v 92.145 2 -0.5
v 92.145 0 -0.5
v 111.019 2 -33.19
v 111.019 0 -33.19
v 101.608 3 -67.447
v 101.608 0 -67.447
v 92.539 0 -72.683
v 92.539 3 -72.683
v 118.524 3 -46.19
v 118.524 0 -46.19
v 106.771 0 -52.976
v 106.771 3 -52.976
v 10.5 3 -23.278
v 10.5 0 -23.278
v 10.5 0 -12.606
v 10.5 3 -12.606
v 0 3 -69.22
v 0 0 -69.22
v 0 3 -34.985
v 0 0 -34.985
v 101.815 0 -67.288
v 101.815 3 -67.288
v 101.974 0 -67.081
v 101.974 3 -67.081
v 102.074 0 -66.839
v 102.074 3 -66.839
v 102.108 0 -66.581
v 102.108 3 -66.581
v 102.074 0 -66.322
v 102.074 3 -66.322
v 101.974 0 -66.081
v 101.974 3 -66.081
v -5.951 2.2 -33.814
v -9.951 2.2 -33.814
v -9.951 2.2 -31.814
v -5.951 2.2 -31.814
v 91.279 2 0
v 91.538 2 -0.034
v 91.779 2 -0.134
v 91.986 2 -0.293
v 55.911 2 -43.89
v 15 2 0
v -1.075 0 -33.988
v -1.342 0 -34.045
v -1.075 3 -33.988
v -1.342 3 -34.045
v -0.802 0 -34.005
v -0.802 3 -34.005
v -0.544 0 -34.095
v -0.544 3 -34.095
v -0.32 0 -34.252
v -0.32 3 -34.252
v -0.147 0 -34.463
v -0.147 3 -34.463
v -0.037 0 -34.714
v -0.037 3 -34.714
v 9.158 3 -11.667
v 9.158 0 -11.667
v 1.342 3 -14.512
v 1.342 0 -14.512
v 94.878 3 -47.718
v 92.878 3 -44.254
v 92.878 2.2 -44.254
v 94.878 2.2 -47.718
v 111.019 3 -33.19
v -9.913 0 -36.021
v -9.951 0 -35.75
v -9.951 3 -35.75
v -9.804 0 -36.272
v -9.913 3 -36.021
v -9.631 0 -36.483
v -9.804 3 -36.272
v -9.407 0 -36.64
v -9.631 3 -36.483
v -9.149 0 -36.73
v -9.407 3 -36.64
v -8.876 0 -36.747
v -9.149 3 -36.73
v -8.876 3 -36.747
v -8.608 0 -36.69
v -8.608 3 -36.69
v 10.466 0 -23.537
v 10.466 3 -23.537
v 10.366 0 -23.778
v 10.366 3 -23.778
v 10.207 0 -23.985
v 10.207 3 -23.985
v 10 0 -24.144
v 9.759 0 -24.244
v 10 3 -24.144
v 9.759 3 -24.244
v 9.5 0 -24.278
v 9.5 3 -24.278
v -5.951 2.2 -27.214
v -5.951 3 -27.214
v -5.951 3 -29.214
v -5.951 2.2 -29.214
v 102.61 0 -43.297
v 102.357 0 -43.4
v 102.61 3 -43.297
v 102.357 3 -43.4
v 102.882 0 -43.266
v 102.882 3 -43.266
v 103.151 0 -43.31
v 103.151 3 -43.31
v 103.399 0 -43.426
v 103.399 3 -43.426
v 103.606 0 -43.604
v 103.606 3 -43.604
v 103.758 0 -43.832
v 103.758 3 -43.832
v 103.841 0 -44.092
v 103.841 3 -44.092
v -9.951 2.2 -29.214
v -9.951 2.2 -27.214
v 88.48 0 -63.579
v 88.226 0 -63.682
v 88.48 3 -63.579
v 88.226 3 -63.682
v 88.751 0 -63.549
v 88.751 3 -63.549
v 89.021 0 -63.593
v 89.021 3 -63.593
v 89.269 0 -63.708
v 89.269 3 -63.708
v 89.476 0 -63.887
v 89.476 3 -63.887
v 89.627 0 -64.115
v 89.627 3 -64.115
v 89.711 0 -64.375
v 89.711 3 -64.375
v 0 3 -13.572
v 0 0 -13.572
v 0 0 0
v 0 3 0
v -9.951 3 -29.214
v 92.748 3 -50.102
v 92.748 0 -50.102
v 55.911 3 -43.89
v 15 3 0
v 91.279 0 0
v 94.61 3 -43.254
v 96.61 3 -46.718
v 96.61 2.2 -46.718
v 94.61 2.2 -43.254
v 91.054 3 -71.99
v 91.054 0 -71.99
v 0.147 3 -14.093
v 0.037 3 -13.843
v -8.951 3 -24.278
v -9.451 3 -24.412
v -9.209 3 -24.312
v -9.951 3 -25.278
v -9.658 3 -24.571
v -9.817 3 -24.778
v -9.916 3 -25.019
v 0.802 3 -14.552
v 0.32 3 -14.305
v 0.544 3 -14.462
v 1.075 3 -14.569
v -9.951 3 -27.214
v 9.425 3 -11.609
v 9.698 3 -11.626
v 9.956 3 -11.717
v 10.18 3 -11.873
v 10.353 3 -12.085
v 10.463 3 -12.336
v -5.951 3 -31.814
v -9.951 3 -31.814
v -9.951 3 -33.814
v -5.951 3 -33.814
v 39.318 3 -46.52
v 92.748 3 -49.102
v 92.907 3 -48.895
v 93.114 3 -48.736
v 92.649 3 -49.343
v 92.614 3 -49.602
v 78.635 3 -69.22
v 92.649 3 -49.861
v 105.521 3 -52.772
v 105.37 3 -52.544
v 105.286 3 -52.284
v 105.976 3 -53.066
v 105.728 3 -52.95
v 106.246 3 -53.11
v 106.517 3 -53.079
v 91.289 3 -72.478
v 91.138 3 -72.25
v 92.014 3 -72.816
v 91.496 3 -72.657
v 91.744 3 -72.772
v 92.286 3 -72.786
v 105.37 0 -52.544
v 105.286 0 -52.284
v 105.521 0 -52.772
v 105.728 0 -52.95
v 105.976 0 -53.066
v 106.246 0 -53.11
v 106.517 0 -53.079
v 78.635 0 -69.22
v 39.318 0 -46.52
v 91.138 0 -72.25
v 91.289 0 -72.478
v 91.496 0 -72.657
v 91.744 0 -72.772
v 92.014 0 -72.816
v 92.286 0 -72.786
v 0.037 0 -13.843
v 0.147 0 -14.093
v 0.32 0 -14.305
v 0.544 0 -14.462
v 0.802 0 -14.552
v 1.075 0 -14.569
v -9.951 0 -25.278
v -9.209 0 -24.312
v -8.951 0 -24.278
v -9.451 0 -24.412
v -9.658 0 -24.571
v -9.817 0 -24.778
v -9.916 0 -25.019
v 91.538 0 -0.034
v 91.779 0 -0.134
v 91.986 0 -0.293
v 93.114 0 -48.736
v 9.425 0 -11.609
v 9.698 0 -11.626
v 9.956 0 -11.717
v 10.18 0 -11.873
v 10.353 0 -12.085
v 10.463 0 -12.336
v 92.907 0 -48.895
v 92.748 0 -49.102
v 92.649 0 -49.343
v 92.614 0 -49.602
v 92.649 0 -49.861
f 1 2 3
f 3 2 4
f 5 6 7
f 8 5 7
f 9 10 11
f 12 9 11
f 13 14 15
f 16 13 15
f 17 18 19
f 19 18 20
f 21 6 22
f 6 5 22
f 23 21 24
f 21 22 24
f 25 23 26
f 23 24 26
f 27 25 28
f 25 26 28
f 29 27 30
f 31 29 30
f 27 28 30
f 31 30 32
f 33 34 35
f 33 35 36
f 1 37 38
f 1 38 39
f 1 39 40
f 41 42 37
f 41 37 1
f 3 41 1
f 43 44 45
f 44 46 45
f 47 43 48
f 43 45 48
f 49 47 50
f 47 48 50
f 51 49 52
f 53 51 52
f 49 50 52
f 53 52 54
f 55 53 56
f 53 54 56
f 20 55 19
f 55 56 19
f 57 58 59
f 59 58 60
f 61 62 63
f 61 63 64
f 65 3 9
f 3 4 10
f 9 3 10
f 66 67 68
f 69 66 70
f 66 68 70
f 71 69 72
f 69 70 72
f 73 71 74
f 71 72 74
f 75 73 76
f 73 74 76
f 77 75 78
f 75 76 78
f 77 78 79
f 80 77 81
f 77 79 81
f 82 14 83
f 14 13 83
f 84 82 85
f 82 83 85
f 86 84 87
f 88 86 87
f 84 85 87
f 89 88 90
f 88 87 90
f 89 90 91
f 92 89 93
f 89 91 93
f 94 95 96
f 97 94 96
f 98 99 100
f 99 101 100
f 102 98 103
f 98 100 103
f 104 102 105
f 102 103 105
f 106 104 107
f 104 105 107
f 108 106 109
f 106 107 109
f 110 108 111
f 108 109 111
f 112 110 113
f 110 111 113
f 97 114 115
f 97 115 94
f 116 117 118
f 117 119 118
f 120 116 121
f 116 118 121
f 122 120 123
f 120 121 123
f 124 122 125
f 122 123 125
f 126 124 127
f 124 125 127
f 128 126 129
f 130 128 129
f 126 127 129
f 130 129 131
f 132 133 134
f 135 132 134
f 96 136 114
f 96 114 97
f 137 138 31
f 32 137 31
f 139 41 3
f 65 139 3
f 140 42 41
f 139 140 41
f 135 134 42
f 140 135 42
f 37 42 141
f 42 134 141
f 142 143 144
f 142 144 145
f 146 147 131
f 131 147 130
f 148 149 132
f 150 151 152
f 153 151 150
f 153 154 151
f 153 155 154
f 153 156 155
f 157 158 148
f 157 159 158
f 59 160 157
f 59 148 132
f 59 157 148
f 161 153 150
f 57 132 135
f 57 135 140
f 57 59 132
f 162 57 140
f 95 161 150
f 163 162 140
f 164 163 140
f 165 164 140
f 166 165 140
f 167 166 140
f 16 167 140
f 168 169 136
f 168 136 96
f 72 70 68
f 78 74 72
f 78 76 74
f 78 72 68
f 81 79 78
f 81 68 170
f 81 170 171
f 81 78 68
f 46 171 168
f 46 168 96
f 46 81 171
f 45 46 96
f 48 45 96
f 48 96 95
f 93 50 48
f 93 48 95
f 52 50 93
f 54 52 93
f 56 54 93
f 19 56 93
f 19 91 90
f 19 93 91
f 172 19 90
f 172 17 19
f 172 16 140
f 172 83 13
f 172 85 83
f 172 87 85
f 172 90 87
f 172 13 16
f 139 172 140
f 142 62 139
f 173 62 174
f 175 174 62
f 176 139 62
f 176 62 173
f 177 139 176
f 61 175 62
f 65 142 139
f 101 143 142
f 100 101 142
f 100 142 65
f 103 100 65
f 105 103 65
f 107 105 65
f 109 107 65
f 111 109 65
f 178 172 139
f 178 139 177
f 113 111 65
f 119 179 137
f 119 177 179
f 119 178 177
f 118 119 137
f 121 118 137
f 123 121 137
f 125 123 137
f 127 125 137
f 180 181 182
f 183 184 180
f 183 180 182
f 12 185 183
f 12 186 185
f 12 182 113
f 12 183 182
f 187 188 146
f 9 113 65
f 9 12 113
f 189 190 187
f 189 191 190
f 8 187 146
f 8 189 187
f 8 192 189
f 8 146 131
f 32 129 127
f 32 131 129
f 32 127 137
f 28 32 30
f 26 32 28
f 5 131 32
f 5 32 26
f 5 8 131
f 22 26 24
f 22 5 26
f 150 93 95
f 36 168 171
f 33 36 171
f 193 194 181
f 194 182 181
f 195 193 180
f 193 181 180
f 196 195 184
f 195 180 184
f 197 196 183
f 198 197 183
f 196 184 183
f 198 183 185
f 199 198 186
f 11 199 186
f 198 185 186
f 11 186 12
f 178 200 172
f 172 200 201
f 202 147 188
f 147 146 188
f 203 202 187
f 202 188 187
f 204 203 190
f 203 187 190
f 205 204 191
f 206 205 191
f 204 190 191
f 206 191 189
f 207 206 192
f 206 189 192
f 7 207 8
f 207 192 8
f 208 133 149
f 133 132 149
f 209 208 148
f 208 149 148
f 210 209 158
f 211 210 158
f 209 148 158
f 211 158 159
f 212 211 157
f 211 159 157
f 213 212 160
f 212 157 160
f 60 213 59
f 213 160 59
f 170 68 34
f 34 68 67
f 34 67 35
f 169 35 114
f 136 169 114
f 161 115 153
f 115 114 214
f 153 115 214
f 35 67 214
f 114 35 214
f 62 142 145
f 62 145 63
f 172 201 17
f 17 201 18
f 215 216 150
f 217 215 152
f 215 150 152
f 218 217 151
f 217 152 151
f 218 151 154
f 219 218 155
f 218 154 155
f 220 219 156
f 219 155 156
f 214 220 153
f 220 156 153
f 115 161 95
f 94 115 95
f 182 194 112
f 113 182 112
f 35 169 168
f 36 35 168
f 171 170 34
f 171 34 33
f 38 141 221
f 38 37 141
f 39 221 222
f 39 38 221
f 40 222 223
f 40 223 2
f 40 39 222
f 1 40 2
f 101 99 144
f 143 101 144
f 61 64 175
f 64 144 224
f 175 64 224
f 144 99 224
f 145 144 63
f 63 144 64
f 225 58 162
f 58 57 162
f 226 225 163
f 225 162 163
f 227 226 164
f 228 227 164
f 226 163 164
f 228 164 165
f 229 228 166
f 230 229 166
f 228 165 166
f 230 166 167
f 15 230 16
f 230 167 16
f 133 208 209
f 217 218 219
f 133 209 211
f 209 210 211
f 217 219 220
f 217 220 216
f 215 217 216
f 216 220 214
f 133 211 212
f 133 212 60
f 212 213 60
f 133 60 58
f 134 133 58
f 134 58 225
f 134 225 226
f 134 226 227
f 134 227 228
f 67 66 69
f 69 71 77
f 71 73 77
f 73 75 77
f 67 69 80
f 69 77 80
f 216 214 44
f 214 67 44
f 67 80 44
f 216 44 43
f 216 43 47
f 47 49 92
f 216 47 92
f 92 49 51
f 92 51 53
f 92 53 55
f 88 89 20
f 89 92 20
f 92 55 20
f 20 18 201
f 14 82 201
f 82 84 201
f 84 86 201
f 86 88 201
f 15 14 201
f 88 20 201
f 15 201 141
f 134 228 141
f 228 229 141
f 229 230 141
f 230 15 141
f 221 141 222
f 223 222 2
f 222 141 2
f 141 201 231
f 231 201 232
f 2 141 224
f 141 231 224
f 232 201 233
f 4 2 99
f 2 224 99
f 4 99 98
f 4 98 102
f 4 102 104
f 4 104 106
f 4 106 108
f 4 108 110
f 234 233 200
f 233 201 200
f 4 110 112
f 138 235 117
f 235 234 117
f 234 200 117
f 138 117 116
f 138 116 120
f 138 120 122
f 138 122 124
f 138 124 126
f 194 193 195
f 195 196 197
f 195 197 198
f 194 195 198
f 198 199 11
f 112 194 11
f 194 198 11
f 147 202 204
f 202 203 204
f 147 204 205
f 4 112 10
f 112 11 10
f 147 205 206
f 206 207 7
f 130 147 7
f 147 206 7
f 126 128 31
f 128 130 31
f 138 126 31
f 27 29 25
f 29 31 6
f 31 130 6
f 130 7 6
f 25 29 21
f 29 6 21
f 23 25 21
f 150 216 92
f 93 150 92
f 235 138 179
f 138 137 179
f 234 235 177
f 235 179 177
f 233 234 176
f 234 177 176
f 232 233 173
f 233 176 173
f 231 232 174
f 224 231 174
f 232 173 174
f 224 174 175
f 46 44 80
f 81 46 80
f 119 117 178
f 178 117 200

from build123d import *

# Parameters (mm, degrees)
P_IDAT_VYSUNUT_M1_DEPTH  = 3
P_IDAT_VYSUNUT_M2_DEPTH  = 2
ZAOBLIT1_R               = 1
ZAOBLIT2_R               = 1
SKICA2_W                 = 4
SKICA2_H                 = 2
ODEBRAT_VYSUNUT_M1_DEPTH = 0.8


with BuildPart() as part:
    # Skica1 → P_idat vysunut_m1 (new body)
    with BuildSketch(Plane(origin=(0, 0, 0), x_dir=(1, 0, 0), z_dir=(0, 1, 0))):
        Polygon((118.524103266, 46.190077074), (105.53372221, 53.690077074), (103.593400635, 42.685966604), (92.248467845, 49.235966604), (102.473720104, 66.946623035), (91.301992395, 73.396623035), (89.463213481, 62.968389614), (78.635106664, 69.22), (39.317553332, 46.52), (0, 69.22), (0, 33.55662508), (-9.950504516, 37.17831254), (-9.950504516, 24.27831254), (10.5, 24.27831254), (10.5, 11.17831254), (0, 15), (0, 0), (15, 0), (55.910618513, 43.889876884), (111.018549767, 33.190077074), align=None)
    extrude(amount=P_IDAT_VYSUNUT_M1_DEPTH)

    # Skica1_3 → P_idat vysunut_m2 (add)
    with BuildSketch(Plane(origin=(0, 0, 0), x_dir=(1, 0, 0), z_dir=(0, 1, 0))):
        Polygon((91.856249834, 0), (111.018549767, 33.190077074), (55.910618513, 43.889876884), (15, 0), align=None)
    extrude(amount=P_IDAT_VYSUNUT_M2_DEPTH)

    # Zaoblit1
    zaoblit1_edges = [part.edges().sort_by_distance(p)[0] for p in [
        (102.473720104, 1.5, -66.946623035),
        (92.248467845, 1.5, -49.235966604),
        (103.593400635, 1.5, -42.685966604),
        (105.53372221, 1.5, -53.690077074),
        (0, 1.5, -15),
        (10.5, 1.5, -11.17831254),
        (10.5, 1.5, -24.27831254),
        (-9.950504516, 1.5, -24.27831254),
        (-9.950504516, 1.5, -37.17831254),
        (0, 1.5, -33.55662508),
        (89.463213481, 1.5, -62.968389614),
        (91.301992395, 1.5, -73.396623035),
    ]]
    fillet(zaoblit1_edges, radius=ZAOBLIT1_R)

    # Zaoblit2
    zaoblit2_edges = [part.edges().sort_by_distance(p)[0] for p in [
        (91.856249834, 1, 0),
    ]]
    fillet(zaoblit2_edges, radius=ZAOBLIT2_R)

    # Skica2 → Odebrat vysunut_m1 (cut)
    with BuildSketch(Plane(origin=(0, 3, 0), x_dir=(1, 0, 0), z_dir=(0, 1, 0))):
        with Locations((-7.950504516, 32.814238537)):
            Rectangle(SKICA2_W, SKICA2_H)
        with Locations((-7.950504516, 28.214238537)):
            Rectangle(SKICA2_W, SKICA2_H)
        Polygon((94.877656883, 47.718003606), (96.60970769, 46.718003606), (94.60970769, 43.253901991), (92.877656883, 44.253901991), align=None)
    extrude(amount=-ODEBRAT_VYSUNUT_M1_DEPTH, mode=Mode.SUBTRACT)


solid = part.part
